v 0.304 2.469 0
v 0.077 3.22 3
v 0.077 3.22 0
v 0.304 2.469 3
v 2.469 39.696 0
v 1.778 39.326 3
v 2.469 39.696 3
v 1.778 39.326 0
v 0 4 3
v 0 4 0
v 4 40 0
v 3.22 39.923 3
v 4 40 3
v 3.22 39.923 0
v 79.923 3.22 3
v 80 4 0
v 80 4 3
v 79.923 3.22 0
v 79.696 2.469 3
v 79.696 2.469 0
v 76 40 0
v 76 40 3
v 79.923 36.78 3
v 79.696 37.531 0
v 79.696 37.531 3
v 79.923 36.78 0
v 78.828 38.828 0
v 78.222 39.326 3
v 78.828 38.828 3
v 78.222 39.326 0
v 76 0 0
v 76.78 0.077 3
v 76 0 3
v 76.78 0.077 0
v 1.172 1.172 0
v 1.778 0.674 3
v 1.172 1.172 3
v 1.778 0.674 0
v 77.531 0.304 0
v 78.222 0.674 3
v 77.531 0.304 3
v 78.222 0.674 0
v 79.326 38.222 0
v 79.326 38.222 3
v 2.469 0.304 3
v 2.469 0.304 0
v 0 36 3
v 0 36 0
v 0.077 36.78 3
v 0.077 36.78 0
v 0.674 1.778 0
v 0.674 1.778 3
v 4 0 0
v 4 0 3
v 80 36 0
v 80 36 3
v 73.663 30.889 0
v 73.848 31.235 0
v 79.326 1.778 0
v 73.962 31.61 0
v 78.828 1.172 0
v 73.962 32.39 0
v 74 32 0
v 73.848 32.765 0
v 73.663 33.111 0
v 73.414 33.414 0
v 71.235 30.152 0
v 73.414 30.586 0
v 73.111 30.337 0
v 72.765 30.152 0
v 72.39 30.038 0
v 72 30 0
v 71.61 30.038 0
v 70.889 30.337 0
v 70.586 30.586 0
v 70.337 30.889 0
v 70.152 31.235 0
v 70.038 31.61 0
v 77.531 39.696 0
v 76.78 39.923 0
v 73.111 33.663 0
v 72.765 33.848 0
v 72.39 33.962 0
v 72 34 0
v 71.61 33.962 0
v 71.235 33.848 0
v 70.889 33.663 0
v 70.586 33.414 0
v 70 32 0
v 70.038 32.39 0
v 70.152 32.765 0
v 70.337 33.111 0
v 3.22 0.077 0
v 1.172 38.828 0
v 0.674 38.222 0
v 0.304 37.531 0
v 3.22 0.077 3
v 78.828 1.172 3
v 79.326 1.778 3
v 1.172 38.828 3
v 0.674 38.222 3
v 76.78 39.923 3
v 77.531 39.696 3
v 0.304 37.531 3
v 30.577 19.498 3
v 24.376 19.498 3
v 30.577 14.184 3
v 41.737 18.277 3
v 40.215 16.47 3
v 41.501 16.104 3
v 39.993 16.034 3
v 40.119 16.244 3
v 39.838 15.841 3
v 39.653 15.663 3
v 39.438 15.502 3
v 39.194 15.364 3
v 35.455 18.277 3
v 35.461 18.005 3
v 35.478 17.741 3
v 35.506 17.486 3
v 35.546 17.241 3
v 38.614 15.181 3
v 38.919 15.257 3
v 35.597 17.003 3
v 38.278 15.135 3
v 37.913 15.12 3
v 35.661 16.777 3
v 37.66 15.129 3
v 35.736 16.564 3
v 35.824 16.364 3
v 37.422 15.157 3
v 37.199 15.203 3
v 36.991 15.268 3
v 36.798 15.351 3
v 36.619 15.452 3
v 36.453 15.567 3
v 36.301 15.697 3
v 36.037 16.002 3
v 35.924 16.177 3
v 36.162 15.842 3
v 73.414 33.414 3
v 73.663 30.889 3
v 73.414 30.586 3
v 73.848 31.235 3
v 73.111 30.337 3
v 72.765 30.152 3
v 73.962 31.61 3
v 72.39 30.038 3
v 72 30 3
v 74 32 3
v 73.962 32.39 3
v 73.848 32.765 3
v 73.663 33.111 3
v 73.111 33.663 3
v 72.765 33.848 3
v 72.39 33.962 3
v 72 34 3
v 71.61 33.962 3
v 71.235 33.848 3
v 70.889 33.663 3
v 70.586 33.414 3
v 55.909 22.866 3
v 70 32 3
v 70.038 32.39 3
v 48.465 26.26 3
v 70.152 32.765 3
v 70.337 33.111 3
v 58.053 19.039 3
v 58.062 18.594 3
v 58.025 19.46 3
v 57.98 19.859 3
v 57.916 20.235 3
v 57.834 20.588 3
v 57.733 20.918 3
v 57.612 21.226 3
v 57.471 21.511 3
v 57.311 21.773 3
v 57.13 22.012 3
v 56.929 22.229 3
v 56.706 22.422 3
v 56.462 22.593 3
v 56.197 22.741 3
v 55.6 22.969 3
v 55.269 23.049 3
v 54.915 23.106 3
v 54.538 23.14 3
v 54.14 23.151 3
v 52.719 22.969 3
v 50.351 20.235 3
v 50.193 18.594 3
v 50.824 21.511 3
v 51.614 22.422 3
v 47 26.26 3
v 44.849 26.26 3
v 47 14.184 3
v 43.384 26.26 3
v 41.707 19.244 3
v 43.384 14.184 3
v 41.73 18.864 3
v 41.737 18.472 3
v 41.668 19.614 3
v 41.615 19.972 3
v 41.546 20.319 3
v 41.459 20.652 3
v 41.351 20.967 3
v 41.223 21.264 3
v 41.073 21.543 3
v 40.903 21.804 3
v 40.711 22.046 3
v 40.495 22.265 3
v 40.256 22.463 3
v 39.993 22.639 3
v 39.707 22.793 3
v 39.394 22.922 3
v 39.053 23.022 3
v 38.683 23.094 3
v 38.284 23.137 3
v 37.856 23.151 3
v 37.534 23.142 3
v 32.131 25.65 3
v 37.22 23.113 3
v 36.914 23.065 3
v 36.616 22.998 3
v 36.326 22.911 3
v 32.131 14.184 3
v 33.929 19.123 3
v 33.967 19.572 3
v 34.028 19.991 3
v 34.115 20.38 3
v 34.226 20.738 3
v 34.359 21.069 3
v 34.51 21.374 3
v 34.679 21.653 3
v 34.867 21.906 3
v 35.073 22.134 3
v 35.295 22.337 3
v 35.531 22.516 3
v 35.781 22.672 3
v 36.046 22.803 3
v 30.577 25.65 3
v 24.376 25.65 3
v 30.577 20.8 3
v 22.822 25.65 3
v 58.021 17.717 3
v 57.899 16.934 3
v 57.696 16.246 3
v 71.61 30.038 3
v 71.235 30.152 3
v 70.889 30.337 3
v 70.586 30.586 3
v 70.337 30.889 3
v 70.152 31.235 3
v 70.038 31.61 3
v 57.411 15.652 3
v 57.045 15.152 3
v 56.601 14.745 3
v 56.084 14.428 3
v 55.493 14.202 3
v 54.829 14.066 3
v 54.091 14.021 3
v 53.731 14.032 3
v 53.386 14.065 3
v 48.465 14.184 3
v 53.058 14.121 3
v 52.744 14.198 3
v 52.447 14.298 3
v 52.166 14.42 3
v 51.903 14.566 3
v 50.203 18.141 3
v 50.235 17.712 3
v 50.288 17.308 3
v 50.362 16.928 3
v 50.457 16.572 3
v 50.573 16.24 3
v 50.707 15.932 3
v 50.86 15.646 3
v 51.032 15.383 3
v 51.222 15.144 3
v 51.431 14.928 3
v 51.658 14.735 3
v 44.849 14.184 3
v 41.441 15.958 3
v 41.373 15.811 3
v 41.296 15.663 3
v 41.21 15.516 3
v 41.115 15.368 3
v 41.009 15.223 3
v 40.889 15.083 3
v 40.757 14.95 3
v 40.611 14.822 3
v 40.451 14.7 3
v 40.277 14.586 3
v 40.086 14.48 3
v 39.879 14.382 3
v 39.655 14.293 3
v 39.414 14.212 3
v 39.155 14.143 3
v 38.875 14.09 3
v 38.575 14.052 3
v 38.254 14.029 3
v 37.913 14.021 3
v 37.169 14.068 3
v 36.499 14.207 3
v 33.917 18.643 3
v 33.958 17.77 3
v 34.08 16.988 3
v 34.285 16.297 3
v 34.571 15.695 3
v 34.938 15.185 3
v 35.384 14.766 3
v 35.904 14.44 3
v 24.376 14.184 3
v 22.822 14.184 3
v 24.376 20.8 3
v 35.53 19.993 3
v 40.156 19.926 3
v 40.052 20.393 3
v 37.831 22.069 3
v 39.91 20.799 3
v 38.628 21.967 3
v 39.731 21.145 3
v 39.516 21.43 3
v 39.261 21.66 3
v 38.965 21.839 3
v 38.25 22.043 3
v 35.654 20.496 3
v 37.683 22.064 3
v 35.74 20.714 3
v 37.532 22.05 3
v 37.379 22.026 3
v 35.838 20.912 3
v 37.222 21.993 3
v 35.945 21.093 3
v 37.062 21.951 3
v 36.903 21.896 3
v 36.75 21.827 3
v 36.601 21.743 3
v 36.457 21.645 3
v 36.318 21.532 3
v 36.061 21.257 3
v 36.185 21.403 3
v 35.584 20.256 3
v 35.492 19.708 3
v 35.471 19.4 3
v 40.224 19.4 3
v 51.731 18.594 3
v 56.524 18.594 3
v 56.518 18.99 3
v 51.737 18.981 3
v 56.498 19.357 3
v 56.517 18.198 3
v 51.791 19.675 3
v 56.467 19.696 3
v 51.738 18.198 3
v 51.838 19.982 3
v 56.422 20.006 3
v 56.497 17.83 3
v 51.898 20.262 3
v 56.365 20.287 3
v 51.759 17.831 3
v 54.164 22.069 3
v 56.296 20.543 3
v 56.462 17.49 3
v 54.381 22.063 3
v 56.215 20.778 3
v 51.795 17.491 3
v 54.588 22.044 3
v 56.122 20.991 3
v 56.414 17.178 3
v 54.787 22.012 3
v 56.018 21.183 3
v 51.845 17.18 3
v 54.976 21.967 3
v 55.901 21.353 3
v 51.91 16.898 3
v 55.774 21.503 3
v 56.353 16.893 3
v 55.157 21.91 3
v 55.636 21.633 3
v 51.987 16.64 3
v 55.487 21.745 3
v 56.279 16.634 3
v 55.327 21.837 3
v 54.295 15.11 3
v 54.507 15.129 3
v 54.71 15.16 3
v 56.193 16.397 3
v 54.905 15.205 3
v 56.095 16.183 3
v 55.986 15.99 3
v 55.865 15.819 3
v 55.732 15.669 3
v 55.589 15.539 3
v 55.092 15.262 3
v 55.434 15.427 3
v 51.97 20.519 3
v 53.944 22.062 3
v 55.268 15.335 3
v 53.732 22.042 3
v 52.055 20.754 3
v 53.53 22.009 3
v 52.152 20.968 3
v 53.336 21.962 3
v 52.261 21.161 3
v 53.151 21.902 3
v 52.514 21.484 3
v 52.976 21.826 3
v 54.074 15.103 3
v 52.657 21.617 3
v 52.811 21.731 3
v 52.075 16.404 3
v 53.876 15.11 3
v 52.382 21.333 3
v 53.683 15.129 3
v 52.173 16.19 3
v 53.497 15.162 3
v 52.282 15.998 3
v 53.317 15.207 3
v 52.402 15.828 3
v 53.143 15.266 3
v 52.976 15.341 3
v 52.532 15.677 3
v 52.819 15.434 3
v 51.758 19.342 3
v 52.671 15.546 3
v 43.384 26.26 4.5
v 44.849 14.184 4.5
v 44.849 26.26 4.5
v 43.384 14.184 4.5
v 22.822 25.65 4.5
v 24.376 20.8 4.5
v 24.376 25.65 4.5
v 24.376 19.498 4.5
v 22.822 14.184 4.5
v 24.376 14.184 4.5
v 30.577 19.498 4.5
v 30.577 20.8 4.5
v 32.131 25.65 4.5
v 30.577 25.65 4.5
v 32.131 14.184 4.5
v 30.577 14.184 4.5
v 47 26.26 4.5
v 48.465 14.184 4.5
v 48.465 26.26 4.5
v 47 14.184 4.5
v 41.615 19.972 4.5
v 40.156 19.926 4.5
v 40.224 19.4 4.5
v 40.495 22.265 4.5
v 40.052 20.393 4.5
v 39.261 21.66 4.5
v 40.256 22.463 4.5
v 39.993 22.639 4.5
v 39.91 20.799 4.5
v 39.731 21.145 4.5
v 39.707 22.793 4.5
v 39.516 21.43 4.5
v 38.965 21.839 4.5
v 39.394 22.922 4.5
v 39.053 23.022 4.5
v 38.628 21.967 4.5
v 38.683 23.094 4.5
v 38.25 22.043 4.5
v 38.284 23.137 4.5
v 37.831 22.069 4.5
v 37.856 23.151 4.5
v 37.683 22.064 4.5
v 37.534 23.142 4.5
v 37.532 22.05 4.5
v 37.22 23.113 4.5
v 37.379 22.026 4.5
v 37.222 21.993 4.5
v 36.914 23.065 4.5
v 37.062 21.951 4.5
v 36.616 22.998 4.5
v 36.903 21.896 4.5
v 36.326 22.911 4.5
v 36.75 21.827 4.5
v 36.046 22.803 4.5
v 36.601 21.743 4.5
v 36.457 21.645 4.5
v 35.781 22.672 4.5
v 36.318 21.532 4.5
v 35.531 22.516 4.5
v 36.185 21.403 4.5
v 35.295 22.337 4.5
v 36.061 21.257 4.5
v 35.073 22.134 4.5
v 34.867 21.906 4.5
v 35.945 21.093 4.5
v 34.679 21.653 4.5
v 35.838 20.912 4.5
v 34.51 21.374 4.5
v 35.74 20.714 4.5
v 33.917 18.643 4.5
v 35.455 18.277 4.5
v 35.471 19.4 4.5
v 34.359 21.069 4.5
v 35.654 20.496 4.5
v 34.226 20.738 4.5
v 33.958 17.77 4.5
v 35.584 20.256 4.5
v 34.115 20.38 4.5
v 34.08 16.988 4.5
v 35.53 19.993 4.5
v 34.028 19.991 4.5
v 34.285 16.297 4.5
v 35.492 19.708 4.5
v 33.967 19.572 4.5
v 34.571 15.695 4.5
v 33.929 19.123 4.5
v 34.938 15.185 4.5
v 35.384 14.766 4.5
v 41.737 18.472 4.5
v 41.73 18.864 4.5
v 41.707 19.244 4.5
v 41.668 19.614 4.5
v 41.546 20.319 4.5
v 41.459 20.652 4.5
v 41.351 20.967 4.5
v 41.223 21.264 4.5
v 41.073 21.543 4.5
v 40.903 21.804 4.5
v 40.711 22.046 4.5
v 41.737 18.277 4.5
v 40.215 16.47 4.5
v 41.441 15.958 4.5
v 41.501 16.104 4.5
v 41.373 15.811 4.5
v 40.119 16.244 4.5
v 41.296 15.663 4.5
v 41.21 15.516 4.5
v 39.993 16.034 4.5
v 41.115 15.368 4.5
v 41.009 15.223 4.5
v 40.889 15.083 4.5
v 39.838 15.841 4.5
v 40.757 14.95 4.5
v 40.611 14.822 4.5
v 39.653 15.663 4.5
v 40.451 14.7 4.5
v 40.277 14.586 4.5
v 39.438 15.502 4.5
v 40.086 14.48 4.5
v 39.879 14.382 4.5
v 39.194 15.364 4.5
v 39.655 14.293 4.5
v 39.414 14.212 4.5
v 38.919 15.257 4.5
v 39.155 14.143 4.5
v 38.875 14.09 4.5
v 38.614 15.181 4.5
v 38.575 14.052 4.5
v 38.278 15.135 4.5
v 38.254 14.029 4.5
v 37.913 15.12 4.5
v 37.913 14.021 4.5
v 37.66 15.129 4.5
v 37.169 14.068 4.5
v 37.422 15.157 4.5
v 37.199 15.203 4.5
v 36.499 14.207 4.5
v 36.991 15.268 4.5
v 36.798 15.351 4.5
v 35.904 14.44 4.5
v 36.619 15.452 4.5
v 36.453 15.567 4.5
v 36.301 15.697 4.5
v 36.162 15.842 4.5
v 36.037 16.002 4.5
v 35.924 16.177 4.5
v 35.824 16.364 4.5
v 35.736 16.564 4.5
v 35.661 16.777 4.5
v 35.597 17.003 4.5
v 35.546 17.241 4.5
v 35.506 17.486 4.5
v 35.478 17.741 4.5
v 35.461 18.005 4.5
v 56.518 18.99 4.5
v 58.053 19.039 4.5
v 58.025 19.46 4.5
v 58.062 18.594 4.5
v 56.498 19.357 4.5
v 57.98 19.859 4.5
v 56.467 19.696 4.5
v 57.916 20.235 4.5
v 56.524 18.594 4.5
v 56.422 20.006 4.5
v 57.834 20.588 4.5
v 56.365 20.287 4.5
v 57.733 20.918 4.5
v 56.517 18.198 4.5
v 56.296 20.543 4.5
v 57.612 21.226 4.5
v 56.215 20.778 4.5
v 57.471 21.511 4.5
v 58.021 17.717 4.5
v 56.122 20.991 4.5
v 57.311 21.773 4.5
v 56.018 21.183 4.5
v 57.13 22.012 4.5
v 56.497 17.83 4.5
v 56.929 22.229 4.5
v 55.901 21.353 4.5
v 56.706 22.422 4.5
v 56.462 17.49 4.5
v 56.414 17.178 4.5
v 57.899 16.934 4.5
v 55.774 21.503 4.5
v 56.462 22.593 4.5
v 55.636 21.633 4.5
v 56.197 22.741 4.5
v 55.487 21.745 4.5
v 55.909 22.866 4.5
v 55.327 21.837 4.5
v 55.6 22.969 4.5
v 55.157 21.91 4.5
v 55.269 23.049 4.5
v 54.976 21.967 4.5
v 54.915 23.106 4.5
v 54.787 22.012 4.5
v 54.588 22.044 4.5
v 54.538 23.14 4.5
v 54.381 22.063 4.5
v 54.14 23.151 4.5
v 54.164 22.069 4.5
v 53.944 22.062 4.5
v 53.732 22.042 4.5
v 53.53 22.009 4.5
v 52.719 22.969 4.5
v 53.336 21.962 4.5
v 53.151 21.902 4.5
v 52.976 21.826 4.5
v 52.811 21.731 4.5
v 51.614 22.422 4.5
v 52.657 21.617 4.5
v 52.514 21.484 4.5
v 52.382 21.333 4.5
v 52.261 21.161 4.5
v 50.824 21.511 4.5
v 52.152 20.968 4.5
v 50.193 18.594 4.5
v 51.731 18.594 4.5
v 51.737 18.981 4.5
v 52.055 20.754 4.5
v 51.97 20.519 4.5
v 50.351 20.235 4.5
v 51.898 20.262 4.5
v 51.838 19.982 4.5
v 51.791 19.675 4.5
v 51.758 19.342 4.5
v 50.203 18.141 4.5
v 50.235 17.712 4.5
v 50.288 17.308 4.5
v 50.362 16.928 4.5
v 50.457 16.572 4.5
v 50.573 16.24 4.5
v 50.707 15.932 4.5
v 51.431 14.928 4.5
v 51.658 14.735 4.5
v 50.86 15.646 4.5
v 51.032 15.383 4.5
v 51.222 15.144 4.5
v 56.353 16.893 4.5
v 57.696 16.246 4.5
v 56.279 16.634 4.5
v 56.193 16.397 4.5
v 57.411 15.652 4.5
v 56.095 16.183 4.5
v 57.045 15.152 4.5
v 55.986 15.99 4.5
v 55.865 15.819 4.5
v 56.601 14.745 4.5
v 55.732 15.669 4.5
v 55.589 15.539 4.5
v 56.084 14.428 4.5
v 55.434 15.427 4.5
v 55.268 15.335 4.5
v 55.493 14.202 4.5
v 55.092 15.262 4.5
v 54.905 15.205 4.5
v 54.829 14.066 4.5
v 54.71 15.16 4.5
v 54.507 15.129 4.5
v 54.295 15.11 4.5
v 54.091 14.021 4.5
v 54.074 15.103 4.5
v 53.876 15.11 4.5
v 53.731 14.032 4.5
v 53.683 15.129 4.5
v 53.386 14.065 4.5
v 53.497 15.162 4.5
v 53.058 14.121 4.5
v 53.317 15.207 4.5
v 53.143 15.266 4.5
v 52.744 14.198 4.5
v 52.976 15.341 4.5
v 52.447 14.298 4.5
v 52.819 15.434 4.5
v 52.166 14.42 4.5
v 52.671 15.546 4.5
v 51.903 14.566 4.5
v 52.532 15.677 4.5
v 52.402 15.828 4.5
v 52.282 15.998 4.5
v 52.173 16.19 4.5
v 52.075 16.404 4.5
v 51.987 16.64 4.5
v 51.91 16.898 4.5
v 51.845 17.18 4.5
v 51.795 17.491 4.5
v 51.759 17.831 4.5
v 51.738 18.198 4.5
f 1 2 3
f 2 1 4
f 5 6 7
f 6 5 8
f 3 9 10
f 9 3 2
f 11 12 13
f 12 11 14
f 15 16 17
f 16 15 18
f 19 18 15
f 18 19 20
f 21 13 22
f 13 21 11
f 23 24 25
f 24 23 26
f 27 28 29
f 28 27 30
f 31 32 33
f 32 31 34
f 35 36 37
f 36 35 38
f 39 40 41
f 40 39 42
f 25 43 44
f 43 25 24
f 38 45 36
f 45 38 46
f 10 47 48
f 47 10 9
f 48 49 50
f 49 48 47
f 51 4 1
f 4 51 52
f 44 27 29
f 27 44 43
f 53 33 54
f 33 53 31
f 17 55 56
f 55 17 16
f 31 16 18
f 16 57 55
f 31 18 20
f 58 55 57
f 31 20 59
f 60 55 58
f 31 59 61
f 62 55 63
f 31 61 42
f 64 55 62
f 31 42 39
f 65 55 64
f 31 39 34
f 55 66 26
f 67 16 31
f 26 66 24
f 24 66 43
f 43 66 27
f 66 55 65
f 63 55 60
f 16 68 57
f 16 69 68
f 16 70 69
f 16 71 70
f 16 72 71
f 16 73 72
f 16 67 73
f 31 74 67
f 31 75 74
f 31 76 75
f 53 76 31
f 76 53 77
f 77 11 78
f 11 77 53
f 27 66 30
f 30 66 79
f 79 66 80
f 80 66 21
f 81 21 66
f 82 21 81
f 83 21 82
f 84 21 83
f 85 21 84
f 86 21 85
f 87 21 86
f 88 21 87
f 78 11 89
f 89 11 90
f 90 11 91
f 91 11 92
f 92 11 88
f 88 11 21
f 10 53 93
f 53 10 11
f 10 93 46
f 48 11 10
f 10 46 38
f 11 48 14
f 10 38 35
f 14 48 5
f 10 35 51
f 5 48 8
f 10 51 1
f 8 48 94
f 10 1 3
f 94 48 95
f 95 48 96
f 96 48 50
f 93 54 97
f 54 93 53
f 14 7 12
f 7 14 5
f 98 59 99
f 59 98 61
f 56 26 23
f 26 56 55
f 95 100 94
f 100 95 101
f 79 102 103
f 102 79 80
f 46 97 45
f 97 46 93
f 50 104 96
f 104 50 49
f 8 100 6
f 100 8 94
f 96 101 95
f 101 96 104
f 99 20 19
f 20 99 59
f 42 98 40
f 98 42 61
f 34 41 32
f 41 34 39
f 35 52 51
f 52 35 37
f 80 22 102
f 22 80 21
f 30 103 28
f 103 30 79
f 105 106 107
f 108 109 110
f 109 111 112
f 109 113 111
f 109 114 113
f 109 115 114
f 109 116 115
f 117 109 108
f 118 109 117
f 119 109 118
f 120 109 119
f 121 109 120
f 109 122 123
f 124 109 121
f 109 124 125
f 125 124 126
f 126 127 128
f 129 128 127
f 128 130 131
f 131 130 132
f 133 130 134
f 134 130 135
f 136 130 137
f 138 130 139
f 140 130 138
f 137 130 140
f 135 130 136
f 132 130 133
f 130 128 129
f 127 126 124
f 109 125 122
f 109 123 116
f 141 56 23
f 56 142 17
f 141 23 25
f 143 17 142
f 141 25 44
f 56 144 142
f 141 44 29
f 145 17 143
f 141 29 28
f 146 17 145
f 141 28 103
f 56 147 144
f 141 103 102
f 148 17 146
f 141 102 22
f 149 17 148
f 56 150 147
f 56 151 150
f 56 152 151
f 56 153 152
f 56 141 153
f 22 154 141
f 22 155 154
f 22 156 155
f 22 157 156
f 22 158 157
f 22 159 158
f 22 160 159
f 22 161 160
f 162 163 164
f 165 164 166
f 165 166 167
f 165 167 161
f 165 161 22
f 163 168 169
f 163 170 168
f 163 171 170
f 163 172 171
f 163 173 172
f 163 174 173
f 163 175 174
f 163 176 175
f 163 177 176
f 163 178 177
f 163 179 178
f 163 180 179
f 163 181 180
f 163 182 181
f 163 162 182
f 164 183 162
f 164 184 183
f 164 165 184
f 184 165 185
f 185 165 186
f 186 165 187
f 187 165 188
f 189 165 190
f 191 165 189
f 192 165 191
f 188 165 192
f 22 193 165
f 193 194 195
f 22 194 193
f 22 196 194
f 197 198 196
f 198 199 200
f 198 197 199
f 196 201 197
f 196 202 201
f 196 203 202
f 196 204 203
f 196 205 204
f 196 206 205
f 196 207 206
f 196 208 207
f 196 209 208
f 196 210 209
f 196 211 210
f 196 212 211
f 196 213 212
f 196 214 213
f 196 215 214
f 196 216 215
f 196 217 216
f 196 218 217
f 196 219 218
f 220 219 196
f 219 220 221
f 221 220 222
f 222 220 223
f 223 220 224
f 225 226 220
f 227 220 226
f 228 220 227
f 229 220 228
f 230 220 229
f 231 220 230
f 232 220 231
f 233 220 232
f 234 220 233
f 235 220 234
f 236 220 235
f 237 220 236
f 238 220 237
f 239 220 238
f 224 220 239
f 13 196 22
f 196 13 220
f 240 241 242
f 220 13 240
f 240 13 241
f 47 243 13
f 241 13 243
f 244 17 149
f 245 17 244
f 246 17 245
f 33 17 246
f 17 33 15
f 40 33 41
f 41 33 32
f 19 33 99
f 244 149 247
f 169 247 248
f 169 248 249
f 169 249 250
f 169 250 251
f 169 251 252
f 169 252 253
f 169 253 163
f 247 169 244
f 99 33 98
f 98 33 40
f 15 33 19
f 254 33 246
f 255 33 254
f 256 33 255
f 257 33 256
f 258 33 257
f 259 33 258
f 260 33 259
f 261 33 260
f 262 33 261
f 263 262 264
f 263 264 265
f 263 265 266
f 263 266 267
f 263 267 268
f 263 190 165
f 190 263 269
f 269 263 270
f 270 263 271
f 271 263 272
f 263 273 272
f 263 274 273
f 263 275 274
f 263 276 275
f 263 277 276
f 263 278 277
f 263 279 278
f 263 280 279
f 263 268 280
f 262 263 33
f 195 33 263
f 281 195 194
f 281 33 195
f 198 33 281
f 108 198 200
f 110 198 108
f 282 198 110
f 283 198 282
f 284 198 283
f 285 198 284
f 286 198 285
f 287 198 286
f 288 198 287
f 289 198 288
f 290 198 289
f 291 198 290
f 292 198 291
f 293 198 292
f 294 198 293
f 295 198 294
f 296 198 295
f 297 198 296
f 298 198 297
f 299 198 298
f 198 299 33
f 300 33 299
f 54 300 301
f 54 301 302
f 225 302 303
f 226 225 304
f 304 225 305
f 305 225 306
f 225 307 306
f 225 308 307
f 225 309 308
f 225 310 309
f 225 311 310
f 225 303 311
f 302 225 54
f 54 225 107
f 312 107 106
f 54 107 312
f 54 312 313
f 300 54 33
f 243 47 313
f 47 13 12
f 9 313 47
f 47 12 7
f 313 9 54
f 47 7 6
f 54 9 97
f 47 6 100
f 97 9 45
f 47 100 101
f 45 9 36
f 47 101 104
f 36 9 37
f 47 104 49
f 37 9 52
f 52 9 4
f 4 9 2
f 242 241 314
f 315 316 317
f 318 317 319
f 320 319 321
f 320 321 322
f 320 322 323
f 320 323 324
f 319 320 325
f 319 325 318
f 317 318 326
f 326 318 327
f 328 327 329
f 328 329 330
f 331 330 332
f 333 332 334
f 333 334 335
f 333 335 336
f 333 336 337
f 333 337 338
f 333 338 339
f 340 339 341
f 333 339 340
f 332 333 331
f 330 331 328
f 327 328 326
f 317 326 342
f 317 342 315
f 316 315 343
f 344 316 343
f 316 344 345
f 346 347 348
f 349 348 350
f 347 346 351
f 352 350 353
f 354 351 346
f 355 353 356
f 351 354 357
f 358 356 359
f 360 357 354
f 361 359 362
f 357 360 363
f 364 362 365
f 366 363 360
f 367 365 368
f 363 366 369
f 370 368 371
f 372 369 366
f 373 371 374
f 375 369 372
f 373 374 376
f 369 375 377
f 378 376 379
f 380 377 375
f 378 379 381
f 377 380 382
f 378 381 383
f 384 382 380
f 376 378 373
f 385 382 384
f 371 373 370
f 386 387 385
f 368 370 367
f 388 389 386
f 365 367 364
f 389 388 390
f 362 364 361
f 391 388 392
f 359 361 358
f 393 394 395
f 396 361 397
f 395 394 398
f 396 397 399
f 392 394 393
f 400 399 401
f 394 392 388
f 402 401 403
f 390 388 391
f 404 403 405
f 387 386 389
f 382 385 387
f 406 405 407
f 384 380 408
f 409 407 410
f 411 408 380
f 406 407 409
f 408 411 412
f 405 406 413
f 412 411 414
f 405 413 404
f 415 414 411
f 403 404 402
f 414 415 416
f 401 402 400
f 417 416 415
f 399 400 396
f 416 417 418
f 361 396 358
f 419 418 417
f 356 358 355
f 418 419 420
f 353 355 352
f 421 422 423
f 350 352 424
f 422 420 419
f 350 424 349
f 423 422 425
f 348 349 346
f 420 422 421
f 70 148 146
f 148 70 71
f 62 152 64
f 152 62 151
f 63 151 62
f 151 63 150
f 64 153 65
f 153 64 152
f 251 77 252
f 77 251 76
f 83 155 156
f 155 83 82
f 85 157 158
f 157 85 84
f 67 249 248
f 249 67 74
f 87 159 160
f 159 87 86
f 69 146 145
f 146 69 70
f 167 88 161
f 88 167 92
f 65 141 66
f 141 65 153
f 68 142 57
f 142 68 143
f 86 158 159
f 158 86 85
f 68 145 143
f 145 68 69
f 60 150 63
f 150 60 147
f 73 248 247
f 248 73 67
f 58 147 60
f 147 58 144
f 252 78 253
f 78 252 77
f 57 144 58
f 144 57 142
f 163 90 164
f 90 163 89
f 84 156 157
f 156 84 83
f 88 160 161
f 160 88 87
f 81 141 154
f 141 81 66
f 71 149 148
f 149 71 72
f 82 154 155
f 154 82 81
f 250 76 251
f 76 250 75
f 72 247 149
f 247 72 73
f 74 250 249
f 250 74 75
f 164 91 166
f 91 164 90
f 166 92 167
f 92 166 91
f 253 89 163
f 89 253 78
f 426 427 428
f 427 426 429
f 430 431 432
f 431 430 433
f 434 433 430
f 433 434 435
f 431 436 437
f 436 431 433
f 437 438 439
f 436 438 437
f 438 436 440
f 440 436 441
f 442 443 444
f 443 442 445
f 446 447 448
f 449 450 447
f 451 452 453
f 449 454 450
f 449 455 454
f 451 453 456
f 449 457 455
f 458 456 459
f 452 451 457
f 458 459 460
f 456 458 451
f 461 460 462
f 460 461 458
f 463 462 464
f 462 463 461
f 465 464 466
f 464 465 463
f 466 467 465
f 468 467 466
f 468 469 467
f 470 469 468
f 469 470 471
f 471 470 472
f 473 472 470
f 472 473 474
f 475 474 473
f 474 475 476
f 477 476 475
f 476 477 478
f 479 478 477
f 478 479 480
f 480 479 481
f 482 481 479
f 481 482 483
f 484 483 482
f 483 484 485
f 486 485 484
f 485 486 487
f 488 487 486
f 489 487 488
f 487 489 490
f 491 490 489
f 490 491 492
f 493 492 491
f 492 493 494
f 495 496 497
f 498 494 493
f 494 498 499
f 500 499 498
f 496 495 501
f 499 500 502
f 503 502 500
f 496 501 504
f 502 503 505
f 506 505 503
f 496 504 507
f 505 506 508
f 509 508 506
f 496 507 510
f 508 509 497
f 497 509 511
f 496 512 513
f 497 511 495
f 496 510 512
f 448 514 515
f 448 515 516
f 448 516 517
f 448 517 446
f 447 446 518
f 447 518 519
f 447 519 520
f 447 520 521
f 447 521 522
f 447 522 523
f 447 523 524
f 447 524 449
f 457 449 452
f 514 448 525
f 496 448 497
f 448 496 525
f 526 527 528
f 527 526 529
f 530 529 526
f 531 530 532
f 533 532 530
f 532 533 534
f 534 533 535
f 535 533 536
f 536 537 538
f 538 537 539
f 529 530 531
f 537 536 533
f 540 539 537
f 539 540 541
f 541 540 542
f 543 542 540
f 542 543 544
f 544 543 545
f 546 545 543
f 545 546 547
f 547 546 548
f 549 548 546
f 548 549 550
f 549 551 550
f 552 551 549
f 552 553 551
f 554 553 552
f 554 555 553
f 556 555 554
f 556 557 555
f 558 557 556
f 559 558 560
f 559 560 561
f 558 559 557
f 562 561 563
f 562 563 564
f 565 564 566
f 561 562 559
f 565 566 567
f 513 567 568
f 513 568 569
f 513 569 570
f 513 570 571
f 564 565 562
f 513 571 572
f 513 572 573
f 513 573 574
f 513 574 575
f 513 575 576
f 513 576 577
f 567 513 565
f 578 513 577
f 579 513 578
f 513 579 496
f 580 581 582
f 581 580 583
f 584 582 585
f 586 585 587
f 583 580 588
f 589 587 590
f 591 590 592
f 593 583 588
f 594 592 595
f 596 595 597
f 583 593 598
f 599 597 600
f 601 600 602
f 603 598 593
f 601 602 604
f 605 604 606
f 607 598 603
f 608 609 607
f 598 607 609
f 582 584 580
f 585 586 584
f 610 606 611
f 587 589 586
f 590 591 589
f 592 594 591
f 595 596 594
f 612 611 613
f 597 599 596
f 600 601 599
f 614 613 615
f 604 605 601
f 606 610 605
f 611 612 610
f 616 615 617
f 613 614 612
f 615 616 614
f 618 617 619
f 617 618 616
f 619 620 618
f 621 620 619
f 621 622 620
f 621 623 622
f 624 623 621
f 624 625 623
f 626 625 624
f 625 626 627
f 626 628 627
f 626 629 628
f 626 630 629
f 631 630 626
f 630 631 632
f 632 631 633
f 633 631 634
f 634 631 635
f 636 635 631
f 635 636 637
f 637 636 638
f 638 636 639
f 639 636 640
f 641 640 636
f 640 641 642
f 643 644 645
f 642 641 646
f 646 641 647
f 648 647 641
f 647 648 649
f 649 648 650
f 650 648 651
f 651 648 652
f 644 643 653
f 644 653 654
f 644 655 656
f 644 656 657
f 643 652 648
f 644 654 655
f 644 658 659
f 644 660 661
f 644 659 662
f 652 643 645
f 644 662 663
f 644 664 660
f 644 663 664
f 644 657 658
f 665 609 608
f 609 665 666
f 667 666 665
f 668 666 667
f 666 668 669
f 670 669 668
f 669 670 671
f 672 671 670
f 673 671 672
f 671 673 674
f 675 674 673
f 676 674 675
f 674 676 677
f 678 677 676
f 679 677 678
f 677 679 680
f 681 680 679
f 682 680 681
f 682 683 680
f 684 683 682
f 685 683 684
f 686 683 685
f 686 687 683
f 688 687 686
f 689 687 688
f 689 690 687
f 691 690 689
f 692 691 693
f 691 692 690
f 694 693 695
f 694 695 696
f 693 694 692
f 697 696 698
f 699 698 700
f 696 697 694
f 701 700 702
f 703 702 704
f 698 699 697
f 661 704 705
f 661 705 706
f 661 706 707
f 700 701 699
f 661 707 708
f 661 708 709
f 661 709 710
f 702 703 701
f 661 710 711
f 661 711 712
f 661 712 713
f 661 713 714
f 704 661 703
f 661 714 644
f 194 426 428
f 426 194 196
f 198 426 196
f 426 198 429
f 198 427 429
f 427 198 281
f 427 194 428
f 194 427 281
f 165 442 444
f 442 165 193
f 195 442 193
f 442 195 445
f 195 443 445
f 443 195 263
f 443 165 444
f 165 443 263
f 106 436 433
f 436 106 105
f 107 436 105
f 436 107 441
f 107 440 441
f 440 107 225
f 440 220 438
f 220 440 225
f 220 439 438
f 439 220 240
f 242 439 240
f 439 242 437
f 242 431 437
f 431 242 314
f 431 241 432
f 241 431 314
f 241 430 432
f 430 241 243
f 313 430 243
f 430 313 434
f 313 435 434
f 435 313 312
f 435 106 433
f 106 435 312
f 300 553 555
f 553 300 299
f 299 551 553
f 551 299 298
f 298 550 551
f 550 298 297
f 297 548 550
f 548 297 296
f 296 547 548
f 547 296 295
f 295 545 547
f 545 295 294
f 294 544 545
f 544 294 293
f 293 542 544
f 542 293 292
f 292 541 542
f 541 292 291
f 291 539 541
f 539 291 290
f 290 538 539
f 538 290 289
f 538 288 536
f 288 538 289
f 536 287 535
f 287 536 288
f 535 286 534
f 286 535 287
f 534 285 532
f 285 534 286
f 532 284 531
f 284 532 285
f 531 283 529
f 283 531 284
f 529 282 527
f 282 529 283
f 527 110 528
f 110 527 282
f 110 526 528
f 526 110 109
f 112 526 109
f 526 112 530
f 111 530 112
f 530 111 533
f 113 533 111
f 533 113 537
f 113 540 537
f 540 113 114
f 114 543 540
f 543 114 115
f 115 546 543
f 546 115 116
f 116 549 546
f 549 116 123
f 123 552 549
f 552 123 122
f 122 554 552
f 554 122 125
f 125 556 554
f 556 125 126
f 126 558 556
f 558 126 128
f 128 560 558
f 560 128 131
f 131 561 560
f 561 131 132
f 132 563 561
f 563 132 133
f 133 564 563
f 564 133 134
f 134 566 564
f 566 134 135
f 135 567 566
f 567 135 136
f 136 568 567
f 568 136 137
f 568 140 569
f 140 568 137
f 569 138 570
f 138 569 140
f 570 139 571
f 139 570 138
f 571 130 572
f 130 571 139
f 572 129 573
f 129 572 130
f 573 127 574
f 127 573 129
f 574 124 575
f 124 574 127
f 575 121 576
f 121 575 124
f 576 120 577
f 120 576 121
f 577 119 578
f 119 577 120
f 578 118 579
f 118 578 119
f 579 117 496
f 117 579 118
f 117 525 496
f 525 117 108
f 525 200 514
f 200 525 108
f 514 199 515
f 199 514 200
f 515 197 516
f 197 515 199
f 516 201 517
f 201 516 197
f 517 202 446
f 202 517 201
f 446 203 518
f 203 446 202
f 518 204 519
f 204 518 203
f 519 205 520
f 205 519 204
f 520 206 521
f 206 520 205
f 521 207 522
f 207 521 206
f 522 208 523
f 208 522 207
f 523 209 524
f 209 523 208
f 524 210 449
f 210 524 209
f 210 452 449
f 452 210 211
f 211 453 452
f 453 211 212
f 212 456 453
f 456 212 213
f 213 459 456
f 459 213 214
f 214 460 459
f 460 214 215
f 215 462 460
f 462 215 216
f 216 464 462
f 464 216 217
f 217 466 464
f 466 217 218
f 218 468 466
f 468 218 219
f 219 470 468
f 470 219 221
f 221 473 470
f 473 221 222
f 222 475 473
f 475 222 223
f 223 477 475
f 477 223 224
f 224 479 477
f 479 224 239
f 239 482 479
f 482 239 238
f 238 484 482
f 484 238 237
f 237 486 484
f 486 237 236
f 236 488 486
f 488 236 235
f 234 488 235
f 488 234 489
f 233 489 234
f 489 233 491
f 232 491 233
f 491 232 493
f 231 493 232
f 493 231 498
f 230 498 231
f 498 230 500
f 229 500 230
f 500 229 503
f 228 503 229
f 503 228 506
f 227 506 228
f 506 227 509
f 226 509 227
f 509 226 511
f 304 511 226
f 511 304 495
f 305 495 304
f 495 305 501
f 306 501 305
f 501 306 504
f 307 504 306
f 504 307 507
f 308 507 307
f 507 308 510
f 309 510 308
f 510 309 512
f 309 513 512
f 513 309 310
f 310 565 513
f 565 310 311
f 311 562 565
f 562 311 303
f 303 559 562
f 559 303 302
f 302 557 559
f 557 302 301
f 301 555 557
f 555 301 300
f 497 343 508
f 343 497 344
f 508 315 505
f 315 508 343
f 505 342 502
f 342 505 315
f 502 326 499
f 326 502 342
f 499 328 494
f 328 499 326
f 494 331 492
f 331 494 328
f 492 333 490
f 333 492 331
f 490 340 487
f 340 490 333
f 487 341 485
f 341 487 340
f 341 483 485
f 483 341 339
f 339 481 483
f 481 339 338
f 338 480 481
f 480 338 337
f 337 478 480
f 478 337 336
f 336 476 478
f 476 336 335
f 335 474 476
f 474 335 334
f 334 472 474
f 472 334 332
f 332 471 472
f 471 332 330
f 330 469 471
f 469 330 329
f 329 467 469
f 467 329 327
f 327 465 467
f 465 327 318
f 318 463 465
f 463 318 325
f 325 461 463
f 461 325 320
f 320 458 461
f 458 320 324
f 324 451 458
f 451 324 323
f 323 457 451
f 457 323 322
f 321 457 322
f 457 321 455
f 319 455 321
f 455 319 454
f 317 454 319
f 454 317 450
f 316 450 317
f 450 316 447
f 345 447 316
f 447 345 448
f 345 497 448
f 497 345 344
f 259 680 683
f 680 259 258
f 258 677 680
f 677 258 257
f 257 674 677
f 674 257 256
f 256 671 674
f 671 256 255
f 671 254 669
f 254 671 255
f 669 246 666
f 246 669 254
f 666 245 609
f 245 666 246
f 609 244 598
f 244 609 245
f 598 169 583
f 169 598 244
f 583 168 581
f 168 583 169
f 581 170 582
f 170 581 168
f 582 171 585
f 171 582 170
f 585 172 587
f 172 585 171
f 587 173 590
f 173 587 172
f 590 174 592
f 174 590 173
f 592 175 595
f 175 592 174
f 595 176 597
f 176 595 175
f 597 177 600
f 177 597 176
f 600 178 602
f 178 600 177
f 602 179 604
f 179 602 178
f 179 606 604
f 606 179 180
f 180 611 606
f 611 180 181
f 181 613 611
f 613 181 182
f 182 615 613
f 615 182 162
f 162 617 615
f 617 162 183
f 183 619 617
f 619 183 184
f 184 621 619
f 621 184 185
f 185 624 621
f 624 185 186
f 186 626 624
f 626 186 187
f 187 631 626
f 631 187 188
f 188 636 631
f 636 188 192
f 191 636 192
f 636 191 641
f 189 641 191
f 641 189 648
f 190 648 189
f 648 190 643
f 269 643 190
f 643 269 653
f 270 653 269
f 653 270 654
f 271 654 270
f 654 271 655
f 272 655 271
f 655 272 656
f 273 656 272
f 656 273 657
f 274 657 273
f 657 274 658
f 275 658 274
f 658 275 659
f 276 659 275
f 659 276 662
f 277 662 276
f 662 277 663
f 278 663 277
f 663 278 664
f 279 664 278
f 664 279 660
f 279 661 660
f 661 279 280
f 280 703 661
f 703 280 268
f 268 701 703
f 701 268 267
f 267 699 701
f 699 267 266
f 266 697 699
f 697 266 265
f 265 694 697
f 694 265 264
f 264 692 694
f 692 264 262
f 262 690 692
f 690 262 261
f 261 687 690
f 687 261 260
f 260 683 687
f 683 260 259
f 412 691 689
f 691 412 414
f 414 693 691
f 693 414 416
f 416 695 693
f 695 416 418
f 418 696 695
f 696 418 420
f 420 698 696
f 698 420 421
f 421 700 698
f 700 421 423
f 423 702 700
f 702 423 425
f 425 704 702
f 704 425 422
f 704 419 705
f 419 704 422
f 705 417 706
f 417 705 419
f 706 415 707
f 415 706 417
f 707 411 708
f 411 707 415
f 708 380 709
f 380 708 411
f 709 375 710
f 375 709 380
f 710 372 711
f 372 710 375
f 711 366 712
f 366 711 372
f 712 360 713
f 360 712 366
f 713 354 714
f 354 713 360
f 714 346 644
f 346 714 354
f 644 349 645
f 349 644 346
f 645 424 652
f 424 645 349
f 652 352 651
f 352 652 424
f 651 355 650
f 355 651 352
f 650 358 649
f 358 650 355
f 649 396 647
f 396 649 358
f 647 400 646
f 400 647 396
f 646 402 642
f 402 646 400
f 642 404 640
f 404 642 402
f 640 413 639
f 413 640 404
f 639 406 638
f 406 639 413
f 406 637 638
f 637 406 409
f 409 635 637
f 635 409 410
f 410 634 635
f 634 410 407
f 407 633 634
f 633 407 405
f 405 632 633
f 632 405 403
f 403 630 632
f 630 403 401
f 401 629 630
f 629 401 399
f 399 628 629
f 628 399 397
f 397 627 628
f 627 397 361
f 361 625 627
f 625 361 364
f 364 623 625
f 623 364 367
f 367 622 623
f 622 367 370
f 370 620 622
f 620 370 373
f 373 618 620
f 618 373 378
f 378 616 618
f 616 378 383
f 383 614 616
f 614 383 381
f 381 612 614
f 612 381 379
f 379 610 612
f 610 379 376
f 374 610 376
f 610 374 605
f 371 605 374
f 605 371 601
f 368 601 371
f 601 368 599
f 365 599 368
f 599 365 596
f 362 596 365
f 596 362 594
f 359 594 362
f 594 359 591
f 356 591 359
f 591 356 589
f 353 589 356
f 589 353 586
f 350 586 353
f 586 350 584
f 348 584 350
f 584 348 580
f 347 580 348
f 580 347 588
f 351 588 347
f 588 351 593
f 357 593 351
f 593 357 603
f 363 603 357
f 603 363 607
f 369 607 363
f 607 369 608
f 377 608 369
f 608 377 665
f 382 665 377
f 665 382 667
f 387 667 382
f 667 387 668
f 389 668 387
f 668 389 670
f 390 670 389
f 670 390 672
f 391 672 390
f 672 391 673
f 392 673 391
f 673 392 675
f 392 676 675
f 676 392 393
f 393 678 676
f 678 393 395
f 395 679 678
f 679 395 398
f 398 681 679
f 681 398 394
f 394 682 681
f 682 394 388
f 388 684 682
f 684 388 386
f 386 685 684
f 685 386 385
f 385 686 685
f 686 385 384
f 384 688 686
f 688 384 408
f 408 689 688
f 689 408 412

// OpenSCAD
// Yantra4D wrapper — Gift Tag
// Rounded rectangle with hanging hole and text

message = "Hello";
font_size = 12;
text_depth = 1.5;
base_width = 80;
base_height = 40;
base_thickness = 3;
raised = true;
hole_diameter = 4;
fn = 0;
render_mode = 0;

$fn = fn > 0 ? fn : 32;

// Font and clip -- see plaque.scad for the full rationale. In short: neither
// kernel named a font, so each resolved its own default face and the two set
// the same string at the same nominal size to different widths (1.656 mm of
// bounding box at name_plaque, 2.80% of volume at door_sign). Name the font on
// both sides, and clip raised text to the plate so the bounding box can never
// grow with the string.
FONT = "Liberation Sans";


corner_r = 4;
hole_r = hole_diameter / 2;
hole_x = base_width - corner_r - hole_r - 2;
hole_y = base_height - corner_r - hole_r - 2;

module rounded_rect(w, h, r) {
    hull() {
        translate([r, r]) circle(r);
        translate([w - r, r]) circle(r);
        translate([r, h - r]) circle(r);
        translate([w - r, h - r]) circle(r);
    }
}

module tag_base() {
    difference() {
        linear_extrude(base_thickness)
            rounded_rect(base_width, base_height, corner_r);
        // Hanging hole
        translate([hole_x, hole_y, -0.5])
            cylinder(h = base_thickness + 1, r = hole_r);
    }
}

if (raised) {
    union() {
        tag_base();
        // Raised text, clipped to the tag's own ROUNDED outline (not a plain
        // rect) so the text is bounded by the same silhouette the plate has.
        intersection() {
            translate([base_width / 2, base_height / 2, base_thickness])
                linear_extrude(text_depth)
                    text(message, size = font_size, font = FONT,
                         halign = "center", valign = "center");
            translate([0, 0, base_thickness])
                linear_extrude(text_depth)
                    rounded_rect(base_width, base_height, corner_r);
        }
    }
} else {
    difference() {
        tag_base();
        translate([base_width / 2, base_height / 2, base_thickness - text_depth])
            linear_extrude(text_depth + 0.1)
                text(message, size = font_size, font = FONT,
                     halign = "center", valign = "center");
    }
}
